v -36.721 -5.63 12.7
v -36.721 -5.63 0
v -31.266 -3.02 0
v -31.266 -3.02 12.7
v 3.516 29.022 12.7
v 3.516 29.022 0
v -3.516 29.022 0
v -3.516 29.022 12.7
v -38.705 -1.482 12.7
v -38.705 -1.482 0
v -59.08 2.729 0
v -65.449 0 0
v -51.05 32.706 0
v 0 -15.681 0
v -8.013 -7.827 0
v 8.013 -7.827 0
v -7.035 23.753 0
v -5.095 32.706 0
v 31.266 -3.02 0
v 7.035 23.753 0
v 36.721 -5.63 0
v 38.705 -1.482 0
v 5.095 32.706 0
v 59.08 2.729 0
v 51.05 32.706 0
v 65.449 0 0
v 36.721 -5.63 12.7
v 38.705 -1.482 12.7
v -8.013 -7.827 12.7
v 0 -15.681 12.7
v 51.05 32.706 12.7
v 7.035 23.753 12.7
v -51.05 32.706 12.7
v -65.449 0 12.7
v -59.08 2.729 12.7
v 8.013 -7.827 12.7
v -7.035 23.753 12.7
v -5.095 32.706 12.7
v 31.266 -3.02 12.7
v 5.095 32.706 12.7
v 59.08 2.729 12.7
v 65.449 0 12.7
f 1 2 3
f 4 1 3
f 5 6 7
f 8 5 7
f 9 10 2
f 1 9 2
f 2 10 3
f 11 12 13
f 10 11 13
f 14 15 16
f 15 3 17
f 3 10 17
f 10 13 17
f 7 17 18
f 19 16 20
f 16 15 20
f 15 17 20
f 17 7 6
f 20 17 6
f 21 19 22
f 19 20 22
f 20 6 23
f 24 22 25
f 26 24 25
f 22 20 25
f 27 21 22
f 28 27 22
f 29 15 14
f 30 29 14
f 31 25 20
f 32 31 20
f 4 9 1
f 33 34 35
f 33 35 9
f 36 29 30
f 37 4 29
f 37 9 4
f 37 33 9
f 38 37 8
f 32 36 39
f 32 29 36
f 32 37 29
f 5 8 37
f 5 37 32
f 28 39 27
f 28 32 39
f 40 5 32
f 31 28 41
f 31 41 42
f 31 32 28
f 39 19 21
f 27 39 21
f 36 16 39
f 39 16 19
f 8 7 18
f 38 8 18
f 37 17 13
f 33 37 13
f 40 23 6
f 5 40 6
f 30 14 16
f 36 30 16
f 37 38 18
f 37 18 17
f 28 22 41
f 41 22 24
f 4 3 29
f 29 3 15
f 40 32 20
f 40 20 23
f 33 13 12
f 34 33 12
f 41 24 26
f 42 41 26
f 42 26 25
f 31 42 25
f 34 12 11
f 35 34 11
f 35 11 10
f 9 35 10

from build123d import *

# Parameters (mm, degrees)
F1_DEPTH = 12.7


with BuildPart() as f1:
    # F0 (on Top) → F1 (new body)
    with BuildSketch(Plane.XY):
        Polygon((0, -15.680935), (0, 29.021675), (-3.516382, 29.021675), (-5.095464, 32.706197), (-7.034861, 23.75273), (-51.050033, 32.706197), (-65.449044, 0), (-59.080428, 2.729409), (-38.705469, -1.482393), (-36.721308, -5.629899), (-31.266223, -3.020194), (-8.013232, -7.826927), align=None)
        Polygon((3.516382, 29.021675), (0, 29.021675), (0, -15.680935), (8.013232, -7.826927), (31.266223, -3.020194), (36.721308, -5.629899), (38.705469, -1.482393), (59.080428, 2.729409), (65.449044, 0), (51.050033, 32.706197), (7.034861, 23.75273), (5.095464, 32.706197), align=None)
    extrude(amount=F1_DEPTH)


solid = f1.part
